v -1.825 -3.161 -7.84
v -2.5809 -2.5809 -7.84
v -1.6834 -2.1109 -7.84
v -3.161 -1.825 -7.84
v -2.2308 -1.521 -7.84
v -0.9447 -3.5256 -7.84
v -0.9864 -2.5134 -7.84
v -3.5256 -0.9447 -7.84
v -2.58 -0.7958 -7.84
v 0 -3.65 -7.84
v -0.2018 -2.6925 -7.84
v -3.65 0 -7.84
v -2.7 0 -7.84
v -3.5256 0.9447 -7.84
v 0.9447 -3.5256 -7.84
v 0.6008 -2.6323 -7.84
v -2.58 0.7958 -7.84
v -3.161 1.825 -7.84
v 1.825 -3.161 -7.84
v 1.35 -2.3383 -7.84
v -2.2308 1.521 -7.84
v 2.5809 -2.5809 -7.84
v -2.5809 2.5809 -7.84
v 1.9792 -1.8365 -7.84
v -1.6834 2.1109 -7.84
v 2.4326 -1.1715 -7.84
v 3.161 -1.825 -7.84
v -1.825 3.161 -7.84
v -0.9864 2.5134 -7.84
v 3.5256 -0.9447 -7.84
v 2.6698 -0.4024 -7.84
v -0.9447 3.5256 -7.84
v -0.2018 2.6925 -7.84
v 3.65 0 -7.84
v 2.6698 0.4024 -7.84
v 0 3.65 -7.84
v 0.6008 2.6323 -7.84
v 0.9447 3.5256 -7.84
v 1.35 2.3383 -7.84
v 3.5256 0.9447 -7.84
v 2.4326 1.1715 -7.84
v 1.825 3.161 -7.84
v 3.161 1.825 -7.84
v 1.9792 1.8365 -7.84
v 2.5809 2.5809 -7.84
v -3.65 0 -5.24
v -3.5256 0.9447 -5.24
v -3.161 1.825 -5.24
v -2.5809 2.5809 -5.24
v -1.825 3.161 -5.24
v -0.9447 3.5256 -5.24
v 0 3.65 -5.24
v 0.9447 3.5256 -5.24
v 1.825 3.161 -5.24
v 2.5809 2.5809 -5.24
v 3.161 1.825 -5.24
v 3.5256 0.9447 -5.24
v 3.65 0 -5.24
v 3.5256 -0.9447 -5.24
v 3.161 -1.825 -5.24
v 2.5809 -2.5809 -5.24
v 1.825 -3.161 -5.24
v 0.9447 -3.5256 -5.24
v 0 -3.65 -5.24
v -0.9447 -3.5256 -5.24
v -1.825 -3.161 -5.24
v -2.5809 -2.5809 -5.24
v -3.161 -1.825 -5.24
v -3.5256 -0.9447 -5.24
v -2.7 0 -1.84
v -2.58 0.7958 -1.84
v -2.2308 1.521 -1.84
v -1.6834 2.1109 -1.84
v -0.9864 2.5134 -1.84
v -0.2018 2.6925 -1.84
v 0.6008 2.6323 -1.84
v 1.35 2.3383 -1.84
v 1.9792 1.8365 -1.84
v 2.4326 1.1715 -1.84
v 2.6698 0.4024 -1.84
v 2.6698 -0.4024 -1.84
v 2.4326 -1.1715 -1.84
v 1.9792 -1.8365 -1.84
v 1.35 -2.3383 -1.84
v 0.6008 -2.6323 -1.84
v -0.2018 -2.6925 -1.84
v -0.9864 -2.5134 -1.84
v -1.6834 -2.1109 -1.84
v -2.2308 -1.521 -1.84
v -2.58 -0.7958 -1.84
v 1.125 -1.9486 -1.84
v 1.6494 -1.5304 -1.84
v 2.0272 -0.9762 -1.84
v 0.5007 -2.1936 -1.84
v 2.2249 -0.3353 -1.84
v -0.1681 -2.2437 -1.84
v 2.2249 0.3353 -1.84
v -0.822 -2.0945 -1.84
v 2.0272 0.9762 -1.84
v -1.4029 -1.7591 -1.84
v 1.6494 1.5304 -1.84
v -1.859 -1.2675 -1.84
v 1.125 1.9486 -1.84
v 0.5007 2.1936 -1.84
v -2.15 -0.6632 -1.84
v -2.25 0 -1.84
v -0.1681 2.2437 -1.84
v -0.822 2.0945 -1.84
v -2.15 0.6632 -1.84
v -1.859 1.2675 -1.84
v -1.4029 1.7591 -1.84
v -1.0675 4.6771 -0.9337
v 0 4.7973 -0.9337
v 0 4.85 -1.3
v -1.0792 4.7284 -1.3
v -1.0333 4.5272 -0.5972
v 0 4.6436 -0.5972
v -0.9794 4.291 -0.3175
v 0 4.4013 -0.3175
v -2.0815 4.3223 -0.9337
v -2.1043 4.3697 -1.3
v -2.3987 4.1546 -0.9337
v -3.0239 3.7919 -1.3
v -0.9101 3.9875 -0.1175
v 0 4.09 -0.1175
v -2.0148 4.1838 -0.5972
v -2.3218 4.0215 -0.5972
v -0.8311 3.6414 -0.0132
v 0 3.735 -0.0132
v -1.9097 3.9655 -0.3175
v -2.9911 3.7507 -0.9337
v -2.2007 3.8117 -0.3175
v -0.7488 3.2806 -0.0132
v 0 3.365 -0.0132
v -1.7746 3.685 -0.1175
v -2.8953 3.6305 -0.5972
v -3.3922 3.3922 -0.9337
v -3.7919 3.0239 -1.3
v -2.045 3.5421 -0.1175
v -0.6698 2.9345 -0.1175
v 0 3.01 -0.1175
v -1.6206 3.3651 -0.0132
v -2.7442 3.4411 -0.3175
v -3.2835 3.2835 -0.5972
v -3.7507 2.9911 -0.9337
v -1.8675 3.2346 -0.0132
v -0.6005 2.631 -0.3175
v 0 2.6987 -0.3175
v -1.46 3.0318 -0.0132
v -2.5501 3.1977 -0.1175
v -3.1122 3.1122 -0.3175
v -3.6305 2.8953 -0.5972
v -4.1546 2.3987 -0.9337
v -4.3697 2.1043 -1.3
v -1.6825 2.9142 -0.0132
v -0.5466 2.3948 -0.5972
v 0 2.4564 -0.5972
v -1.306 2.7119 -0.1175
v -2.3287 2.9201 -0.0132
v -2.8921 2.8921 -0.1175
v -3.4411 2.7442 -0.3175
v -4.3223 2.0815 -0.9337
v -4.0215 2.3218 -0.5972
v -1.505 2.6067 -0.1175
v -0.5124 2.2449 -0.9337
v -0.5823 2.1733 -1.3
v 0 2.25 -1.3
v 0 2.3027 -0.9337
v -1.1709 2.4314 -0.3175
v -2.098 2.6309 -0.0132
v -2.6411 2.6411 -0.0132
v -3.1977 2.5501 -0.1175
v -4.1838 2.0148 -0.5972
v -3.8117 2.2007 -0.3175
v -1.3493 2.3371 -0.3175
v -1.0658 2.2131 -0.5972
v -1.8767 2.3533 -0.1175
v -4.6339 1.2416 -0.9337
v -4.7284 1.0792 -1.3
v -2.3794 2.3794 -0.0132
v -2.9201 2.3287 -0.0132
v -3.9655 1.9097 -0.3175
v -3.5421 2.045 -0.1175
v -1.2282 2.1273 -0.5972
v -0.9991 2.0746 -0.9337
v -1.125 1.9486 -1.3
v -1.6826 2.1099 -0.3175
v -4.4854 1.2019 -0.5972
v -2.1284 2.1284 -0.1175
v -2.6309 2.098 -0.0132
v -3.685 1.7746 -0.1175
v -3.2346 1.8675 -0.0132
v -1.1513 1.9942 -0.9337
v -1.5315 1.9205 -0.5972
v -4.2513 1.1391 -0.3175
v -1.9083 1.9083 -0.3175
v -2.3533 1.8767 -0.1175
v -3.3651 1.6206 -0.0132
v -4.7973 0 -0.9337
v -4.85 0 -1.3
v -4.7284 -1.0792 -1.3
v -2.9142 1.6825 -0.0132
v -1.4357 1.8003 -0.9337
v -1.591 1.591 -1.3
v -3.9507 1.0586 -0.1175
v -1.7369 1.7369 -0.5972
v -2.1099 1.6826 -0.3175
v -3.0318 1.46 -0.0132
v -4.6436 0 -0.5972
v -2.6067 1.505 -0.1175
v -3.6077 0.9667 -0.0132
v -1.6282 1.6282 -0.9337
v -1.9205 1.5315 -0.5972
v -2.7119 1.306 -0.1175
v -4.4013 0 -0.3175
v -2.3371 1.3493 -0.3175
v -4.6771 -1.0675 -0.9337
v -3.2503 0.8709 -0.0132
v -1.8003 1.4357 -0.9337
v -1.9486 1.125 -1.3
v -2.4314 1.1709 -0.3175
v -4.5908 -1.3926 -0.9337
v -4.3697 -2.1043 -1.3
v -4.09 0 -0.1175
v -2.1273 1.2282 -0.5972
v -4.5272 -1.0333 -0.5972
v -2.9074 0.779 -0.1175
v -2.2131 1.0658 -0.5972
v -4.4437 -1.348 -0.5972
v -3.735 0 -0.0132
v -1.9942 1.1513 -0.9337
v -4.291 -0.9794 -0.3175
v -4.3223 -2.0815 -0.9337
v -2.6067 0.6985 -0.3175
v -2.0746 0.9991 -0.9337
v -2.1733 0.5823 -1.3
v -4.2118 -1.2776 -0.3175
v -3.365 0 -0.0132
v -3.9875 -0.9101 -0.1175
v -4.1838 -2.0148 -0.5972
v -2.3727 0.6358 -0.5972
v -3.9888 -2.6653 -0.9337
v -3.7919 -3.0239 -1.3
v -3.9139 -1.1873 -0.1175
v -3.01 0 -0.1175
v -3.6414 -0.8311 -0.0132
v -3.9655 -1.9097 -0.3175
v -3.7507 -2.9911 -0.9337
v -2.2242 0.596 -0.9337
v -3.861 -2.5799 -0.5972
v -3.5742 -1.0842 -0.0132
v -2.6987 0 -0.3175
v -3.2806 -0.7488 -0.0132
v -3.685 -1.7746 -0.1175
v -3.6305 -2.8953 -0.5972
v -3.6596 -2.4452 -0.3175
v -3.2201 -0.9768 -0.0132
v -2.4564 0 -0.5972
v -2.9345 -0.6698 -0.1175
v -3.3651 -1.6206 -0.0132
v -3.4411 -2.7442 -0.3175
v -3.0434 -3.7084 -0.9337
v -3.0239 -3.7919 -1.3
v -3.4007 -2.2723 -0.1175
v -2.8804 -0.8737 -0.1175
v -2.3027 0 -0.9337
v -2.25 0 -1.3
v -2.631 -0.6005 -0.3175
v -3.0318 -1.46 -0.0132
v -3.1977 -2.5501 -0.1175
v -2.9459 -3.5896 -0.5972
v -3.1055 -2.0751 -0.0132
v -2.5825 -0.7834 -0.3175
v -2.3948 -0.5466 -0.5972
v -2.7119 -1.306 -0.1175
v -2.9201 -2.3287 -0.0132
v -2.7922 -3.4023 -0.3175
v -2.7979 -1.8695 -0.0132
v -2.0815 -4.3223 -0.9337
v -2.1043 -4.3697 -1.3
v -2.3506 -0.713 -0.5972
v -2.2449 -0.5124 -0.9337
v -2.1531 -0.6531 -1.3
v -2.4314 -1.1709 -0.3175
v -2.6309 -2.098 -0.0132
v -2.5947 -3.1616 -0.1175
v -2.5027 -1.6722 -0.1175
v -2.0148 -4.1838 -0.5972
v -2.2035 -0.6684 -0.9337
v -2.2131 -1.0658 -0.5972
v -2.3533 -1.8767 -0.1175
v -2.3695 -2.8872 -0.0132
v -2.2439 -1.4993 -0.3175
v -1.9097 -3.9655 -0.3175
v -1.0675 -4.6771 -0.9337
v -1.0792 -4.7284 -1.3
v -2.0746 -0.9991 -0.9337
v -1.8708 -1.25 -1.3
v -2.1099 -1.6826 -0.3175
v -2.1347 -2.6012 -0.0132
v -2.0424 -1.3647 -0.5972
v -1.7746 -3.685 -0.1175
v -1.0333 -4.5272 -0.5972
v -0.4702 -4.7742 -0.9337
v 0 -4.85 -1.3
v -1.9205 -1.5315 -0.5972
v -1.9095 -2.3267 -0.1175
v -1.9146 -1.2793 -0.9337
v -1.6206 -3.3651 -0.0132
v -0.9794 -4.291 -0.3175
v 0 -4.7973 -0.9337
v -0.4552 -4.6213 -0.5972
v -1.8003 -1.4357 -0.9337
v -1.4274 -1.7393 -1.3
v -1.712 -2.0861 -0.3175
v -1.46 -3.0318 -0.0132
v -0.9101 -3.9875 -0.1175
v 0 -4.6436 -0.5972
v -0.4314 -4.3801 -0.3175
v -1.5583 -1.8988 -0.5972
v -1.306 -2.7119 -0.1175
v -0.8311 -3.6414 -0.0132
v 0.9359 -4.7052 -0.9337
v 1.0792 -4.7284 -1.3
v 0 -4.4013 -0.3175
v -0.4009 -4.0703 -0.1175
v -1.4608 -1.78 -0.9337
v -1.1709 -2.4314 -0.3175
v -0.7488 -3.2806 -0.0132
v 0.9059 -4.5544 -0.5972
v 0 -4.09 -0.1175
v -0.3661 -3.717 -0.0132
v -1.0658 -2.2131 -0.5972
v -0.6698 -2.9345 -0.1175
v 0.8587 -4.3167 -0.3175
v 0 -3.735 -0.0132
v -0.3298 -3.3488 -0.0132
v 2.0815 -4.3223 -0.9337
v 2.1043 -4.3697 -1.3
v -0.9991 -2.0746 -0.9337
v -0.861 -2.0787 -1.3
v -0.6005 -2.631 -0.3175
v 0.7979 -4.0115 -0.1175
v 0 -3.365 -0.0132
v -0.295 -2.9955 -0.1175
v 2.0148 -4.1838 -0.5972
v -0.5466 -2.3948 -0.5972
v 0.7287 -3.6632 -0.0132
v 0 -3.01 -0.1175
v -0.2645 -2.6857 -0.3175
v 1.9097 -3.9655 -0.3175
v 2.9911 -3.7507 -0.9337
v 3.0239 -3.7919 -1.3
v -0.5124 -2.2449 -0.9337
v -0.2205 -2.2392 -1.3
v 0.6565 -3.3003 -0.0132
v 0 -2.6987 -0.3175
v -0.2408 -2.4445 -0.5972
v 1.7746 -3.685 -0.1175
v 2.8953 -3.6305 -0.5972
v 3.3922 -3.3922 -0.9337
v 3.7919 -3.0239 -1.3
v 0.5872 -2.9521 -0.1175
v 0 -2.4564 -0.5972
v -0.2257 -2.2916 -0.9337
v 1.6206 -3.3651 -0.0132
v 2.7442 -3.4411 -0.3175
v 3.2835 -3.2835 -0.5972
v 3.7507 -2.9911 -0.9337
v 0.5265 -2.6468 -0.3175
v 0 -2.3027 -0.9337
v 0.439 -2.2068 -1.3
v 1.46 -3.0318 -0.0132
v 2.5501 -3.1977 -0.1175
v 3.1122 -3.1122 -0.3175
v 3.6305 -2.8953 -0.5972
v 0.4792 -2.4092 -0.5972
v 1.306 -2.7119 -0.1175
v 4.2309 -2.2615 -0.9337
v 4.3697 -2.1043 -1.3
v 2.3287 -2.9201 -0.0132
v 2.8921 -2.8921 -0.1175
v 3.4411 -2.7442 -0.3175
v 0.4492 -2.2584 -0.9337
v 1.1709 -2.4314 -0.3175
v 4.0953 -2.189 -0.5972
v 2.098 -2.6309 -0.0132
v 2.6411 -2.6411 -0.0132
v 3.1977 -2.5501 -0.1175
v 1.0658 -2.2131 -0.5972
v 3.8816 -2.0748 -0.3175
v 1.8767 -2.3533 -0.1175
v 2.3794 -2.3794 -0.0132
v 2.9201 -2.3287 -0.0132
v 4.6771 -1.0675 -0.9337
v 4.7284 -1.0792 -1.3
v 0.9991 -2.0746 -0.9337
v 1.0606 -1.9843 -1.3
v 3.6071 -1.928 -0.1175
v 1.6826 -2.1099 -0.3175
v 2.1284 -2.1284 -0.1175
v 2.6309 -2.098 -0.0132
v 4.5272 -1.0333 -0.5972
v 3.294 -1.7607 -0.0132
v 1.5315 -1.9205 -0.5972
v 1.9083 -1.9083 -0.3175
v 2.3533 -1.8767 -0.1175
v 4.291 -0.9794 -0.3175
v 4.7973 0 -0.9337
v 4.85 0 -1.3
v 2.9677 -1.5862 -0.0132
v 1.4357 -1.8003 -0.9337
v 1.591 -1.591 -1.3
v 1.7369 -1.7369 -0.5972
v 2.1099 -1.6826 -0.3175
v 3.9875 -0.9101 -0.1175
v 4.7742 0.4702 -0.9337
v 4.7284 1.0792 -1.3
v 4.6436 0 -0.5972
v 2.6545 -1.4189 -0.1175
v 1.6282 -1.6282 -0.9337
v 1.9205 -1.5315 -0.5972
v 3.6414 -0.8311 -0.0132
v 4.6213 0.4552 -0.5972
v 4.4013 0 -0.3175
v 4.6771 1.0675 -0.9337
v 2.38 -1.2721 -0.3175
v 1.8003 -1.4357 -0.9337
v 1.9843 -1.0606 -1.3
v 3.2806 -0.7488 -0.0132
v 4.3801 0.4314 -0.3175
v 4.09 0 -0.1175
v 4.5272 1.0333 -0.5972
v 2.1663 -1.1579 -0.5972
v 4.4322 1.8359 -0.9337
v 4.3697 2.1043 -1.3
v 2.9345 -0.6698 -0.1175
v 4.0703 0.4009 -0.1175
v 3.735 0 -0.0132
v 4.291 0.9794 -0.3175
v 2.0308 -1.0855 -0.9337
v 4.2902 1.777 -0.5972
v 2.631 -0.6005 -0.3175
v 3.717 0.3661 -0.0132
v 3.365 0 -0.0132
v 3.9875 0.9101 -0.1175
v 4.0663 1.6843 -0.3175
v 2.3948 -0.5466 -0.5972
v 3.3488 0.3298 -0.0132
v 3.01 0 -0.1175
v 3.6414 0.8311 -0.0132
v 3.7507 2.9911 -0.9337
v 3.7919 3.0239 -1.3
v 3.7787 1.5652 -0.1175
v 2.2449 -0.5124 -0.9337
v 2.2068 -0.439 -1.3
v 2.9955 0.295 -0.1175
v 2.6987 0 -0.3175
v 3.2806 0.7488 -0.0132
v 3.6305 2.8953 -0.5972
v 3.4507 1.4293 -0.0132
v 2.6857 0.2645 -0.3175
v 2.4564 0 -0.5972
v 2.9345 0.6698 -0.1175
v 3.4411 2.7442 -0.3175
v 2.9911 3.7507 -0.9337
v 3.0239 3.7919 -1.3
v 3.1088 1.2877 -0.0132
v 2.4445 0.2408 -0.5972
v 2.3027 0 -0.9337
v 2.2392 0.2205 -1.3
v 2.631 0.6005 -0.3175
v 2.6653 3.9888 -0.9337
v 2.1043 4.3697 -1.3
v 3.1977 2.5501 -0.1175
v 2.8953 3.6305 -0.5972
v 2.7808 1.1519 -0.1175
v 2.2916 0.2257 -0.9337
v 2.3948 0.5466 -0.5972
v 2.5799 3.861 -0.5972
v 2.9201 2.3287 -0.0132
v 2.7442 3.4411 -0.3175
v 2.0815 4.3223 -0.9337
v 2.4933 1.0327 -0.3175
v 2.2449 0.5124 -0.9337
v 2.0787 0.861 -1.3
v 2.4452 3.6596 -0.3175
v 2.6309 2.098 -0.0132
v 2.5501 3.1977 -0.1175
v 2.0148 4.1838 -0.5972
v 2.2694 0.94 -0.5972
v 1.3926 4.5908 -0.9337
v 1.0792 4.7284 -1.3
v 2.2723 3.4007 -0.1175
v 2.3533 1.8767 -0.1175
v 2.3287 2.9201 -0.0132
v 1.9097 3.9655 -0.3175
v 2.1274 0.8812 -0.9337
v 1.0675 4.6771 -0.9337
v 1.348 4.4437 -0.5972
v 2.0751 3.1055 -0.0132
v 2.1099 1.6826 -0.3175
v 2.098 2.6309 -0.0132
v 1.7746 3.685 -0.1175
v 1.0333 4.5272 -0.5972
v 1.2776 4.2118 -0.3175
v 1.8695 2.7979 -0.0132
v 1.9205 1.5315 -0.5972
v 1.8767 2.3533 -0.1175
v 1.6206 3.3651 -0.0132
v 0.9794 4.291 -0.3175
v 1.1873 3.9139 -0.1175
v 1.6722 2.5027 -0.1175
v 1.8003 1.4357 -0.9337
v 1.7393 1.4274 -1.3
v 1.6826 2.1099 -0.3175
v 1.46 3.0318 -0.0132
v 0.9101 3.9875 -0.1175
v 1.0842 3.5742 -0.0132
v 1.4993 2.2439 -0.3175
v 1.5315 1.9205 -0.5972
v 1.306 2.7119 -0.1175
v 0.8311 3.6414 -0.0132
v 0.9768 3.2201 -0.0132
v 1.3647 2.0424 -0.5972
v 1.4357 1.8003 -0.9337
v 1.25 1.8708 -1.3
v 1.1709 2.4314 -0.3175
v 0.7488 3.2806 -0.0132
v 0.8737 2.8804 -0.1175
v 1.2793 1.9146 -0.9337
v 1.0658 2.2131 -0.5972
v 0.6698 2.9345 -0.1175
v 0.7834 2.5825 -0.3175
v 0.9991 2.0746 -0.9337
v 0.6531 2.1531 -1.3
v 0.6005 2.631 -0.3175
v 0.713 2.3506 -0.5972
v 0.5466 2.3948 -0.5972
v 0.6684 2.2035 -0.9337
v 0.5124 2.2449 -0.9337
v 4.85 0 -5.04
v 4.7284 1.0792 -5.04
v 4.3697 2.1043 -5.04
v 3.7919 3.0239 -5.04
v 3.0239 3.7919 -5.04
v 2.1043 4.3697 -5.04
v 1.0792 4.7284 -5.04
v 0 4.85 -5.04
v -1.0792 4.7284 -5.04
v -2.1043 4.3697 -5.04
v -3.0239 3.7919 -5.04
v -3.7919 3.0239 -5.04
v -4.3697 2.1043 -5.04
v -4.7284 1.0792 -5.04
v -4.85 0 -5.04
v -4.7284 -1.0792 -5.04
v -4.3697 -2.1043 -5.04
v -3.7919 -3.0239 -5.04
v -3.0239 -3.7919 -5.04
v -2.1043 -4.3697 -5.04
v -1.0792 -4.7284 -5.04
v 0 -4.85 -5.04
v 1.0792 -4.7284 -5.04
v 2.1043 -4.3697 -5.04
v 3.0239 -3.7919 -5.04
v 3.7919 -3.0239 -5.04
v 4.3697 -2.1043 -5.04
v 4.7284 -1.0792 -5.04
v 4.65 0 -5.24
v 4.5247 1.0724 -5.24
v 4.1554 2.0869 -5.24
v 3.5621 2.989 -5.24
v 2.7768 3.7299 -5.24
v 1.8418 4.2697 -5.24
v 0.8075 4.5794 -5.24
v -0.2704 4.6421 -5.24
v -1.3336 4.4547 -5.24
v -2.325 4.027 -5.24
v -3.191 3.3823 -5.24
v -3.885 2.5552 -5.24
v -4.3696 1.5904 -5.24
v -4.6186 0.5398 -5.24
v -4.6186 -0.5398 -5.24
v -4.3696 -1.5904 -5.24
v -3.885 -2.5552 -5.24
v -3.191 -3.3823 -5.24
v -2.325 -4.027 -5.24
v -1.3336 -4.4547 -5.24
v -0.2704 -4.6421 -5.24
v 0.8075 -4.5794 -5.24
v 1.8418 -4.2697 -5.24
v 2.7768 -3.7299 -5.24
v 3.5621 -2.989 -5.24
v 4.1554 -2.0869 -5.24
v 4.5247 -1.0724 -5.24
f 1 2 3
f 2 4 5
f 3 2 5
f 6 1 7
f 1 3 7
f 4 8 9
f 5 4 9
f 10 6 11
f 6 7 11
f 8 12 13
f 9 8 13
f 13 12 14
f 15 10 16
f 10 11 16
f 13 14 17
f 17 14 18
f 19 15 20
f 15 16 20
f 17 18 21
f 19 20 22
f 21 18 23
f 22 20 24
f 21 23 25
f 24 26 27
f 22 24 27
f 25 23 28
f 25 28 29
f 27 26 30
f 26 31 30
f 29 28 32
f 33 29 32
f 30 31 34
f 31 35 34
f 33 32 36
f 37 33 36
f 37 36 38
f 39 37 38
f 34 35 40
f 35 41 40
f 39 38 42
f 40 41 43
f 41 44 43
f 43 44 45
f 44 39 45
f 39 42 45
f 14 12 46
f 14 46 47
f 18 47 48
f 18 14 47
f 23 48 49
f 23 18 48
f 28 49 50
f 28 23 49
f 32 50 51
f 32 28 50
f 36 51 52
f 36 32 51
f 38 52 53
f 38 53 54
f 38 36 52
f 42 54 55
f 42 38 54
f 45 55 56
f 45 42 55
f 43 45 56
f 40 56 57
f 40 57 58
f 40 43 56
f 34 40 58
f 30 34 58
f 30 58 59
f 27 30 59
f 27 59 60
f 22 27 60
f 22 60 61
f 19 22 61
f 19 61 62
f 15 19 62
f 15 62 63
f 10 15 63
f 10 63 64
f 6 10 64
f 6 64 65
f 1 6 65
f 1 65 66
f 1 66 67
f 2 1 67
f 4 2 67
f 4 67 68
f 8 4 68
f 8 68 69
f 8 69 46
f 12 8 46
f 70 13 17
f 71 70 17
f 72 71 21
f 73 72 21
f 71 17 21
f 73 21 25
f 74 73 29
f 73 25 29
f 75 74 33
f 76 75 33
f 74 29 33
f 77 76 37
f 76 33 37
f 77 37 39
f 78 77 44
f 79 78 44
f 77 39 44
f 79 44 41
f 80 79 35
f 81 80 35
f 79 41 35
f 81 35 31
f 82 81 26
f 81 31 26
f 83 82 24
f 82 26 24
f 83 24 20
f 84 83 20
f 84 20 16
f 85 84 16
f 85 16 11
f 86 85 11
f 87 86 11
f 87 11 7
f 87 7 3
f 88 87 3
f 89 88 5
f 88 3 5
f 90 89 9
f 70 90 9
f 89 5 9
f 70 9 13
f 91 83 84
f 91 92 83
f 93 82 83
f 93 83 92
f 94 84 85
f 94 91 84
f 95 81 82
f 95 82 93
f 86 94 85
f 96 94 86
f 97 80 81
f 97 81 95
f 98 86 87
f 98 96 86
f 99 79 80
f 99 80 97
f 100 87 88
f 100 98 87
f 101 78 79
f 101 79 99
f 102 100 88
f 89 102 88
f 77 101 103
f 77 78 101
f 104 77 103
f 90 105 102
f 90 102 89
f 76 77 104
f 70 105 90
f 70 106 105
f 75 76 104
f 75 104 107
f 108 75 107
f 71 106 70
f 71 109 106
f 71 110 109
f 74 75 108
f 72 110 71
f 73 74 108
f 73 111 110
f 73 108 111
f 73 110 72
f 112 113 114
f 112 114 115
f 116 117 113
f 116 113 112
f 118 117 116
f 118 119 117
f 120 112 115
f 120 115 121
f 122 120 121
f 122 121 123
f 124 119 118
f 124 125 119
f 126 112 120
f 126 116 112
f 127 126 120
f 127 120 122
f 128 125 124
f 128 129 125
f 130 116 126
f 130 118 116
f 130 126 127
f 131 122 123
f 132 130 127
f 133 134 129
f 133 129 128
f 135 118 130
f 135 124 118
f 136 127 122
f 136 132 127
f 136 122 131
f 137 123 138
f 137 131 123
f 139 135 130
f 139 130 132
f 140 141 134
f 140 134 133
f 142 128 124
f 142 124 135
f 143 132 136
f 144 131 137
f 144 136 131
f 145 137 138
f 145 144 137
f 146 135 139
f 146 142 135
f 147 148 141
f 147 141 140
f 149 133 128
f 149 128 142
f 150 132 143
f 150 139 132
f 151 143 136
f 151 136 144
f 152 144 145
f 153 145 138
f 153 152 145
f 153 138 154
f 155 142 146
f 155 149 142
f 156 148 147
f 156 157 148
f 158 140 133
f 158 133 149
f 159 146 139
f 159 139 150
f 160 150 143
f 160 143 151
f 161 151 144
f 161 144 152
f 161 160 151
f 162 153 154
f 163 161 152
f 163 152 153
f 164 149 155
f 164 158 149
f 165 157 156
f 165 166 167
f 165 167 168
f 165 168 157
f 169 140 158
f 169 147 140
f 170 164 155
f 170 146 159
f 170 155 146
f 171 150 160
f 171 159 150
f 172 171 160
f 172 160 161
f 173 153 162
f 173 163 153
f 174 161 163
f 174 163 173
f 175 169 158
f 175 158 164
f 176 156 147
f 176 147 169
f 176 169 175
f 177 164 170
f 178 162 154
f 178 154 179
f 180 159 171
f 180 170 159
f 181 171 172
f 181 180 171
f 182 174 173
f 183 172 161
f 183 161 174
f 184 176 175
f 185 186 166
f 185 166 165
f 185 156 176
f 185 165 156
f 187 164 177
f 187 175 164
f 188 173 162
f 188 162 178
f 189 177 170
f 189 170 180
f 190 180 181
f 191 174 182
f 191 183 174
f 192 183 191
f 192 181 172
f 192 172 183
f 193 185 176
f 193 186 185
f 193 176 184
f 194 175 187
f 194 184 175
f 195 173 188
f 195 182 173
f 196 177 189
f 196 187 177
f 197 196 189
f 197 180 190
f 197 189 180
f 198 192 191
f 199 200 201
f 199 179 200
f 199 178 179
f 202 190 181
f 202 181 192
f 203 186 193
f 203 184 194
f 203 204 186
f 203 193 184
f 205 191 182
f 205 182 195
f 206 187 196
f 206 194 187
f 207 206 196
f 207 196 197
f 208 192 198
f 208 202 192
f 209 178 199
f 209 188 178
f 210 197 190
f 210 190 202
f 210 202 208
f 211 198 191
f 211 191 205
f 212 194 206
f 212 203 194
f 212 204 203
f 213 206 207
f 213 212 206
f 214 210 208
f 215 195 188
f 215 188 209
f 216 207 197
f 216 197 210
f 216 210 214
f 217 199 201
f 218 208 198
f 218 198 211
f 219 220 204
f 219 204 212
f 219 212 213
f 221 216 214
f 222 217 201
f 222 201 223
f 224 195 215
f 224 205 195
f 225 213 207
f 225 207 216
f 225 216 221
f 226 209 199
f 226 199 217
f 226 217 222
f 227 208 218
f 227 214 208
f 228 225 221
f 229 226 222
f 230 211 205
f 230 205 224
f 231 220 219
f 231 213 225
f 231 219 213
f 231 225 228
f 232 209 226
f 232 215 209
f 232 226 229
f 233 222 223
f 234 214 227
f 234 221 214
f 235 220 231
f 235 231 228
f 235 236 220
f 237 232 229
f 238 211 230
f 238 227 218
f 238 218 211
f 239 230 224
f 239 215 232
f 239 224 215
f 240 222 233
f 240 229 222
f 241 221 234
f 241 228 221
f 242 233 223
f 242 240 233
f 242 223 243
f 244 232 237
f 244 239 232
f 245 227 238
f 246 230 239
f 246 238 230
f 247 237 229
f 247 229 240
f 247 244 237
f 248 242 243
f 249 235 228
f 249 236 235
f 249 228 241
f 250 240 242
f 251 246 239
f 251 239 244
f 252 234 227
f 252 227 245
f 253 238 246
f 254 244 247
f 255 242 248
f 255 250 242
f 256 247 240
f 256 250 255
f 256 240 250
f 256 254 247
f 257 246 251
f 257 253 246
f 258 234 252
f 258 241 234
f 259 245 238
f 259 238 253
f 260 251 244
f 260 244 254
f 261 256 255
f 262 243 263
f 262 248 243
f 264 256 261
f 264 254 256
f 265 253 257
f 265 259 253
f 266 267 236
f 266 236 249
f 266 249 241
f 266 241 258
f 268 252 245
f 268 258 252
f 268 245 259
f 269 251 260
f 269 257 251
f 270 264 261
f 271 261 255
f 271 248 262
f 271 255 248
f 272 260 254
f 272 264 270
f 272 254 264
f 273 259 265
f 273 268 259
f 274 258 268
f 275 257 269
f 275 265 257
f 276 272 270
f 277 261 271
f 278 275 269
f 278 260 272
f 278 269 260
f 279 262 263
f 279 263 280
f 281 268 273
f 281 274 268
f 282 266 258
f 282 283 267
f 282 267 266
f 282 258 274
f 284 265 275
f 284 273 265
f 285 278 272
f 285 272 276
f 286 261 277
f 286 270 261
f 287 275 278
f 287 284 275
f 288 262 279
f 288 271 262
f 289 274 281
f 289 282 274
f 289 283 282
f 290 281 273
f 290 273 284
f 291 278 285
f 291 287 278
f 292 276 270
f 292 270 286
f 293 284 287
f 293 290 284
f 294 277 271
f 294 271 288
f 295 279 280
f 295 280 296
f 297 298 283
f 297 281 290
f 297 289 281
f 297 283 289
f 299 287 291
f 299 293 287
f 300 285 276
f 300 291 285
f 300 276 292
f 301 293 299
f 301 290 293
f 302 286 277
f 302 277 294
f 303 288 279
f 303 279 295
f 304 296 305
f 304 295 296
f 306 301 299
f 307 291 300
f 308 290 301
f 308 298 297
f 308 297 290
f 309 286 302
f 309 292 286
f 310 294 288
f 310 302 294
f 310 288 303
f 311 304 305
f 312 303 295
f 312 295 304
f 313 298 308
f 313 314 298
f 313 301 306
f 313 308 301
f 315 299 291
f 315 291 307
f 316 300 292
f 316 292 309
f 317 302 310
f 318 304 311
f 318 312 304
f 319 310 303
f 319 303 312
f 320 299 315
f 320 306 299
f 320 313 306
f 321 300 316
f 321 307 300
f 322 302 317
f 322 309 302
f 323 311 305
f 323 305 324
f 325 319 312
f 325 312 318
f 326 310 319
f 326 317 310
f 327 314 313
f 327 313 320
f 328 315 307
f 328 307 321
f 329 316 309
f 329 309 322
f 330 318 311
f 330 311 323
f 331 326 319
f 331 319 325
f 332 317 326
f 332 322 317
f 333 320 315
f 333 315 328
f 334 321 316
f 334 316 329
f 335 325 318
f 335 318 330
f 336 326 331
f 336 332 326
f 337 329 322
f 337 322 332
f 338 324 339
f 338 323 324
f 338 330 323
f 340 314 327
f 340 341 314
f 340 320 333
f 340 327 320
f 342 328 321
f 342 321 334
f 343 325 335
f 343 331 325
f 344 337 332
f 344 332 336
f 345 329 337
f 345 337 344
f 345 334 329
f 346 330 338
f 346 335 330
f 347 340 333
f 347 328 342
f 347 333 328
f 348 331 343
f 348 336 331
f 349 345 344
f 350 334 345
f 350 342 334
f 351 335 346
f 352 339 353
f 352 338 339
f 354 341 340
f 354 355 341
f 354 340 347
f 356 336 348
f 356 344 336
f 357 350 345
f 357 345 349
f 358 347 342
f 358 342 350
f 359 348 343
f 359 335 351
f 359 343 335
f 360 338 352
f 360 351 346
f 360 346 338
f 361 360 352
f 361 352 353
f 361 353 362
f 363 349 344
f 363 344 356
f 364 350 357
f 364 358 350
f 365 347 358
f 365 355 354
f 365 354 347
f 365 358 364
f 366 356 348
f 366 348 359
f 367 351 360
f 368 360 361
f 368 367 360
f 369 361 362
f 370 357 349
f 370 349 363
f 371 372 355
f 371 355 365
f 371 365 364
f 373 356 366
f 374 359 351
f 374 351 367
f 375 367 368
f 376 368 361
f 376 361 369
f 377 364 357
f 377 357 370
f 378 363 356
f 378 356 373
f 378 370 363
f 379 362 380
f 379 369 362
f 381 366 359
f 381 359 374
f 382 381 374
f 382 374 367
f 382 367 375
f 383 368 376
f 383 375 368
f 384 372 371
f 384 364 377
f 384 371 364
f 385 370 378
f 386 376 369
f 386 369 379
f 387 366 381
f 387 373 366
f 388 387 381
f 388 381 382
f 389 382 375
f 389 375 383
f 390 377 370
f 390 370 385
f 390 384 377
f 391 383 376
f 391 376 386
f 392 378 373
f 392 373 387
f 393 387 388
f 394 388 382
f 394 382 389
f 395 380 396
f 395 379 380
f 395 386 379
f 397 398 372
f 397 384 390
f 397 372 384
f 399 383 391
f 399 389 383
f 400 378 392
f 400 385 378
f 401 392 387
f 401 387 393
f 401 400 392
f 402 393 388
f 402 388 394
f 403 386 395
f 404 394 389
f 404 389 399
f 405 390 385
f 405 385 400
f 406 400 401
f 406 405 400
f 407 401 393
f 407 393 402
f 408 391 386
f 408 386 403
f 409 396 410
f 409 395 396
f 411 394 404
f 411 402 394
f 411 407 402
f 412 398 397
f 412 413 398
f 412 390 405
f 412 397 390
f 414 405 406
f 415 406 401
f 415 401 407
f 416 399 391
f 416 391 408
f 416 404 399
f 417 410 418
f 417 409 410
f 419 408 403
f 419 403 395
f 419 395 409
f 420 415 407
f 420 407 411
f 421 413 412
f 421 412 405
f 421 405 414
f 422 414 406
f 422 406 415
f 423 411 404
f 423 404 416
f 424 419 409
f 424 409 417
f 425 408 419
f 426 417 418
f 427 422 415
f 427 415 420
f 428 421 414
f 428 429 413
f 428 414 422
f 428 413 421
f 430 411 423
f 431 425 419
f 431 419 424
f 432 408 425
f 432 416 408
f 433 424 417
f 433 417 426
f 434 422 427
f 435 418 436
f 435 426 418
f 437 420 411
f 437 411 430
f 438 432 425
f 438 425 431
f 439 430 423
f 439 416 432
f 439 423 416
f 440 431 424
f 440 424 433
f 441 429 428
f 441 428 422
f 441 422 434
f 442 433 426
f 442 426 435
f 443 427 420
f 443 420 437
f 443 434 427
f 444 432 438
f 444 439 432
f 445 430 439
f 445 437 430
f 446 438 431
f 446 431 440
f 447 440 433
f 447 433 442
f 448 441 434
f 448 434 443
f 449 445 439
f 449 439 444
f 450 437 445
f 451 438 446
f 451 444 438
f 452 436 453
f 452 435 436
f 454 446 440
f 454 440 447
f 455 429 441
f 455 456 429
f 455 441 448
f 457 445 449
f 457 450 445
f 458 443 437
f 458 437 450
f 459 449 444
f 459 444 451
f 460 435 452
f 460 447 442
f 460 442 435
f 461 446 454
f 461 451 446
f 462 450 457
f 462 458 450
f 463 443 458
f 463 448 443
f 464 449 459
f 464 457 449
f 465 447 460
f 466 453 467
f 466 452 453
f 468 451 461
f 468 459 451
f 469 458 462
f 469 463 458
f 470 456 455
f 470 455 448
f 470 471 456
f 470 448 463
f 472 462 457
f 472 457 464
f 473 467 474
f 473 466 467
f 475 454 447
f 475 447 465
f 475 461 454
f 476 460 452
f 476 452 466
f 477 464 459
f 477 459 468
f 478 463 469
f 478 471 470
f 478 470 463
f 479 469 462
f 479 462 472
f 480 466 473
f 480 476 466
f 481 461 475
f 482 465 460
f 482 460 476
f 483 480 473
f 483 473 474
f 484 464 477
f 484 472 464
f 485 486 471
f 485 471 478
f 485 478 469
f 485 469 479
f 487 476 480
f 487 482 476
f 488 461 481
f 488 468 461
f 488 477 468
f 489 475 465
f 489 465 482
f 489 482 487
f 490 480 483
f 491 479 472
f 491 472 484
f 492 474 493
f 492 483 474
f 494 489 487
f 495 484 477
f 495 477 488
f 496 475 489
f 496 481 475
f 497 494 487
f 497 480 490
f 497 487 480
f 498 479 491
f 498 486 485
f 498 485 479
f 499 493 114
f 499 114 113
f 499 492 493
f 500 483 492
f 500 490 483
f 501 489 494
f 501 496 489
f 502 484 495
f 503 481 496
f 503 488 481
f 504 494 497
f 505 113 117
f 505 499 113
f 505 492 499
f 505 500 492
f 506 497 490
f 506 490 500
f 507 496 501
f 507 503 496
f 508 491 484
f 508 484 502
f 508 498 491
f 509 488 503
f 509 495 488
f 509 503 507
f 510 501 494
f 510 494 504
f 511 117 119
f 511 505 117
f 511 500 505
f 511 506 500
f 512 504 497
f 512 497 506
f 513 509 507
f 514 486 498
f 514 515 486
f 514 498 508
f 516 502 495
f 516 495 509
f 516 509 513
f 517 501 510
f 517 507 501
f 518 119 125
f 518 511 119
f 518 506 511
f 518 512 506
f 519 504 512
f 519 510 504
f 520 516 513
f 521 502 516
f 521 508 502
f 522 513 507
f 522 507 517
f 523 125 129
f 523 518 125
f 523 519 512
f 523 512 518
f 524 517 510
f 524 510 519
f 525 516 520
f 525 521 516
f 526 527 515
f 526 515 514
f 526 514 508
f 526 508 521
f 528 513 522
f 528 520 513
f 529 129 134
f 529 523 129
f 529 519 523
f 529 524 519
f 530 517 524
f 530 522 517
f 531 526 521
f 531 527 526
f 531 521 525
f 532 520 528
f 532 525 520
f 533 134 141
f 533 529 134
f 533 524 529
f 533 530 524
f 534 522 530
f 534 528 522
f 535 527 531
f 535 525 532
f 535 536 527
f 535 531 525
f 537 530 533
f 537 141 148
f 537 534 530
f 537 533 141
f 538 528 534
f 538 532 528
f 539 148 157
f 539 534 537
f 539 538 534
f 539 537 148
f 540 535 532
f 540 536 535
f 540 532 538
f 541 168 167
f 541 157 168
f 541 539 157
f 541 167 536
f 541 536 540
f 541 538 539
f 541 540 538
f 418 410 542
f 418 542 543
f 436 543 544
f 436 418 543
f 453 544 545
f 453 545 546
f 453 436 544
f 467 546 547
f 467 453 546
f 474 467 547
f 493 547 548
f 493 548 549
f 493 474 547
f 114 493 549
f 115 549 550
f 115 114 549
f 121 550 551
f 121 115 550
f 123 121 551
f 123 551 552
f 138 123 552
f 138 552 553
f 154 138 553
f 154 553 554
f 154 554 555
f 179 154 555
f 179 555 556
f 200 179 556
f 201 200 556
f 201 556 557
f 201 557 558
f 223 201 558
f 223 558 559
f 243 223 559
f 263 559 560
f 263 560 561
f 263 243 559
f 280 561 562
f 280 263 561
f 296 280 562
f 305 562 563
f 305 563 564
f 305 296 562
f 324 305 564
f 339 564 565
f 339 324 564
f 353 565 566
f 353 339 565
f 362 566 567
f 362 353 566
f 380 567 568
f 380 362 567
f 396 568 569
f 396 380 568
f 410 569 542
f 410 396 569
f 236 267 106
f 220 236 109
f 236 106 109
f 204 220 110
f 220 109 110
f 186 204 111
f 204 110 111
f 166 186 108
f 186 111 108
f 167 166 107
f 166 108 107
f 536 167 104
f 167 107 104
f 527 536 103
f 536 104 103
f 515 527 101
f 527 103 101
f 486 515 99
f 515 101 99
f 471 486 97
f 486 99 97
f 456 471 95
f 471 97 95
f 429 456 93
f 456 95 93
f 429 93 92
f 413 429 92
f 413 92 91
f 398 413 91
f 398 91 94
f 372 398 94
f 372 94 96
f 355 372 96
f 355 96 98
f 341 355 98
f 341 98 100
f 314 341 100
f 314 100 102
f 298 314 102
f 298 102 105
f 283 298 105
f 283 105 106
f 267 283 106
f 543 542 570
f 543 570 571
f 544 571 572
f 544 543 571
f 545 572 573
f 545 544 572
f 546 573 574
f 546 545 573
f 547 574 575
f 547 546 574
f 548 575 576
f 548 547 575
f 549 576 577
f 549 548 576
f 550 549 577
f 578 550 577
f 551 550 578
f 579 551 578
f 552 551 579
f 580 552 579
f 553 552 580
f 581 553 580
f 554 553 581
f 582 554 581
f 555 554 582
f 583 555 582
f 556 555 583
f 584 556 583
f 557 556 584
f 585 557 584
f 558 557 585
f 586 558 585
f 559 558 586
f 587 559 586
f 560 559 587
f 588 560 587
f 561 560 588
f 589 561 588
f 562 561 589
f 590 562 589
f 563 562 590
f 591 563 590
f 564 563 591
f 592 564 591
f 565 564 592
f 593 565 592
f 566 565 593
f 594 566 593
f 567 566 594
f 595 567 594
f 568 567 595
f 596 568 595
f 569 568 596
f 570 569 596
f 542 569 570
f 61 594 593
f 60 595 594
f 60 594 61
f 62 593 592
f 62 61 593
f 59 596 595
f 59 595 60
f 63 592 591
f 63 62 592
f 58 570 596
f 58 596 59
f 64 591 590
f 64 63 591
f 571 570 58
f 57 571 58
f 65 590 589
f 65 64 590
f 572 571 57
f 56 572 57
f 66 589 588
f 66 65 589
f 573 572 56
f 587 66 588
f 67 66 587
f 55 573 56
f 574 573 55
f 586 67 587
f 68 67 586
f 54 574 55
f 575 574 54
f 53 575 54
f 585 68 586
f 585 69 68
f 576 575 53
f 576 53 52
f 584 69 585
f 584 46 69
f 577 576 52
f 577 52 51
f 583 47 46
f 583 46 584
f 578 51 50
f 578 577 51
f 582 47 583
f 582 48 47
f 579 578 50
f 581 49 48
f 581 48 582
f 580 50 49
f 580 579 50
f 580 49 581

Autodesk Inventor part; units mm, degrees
ref_plane "YZ Plane" through (0, 0, 0) normal (1, 0, 0) x (0, 1, 0)
ref_plane "XZ Plane" through (0, 0, 0) normal (0, 1, 0) x (-1, 0, 0)
ref_plane "XY Plane" through (0, 0, 0) normal (0, 0, 1) x (1, 0, 0)
sketch "Sketch1" plane through (0, 0, 0) normal (0, 0, 1) x (1, 0, 0)
  circle A0 centre (0, 0) radius 4.85
  dimension "d0" = 9.7
extrude "Extrusion1" add sketch "Sketch1" against normal blind 7.84
sketch "Sketch2" plane through (0, 0, -7.84) normal (0, 0, -1) x (-1, 0, 0)
  circle A0 centre (0, 0) radius 4.85
  circle A1 centre (0, 0) radius 3.65
  circle A2 centre (0, 0) radius 4.85 projected
  dimension "d3" = 7.3
extrude "Extrusion2" cut sketch "Sketch2" against normal blind 2.6
sketch "Sketch5" plane through (0, 0, -7.84) normal (0, 0, -1) x (-1, 0, 0)
  circle A0 centre (0, 0) radius 2.7
  dimension "d21" = 5.4
extrude "Extrusion4" cut sketch "Sketch5" against normal blind 6
sketch "Sketch6" plane through (0, 0, -1.84) normal (0, 0, -1) x (-1, 0, 0)
  circle A0 centre (0, 0) radius 2.25
  dimension "d24" = 4.5
extrude "Extrusion5" cut sketch "Sketch6" against normal through all
sketch "Sketch7" plane through (0, 0, 0) normal (1, 0, 0) x (0, 1, 0)
  line L0 (4.85, 1) -> (4.85, -1.3)
  arc A0 (4.85, -1.3) -> (2.25, -1.3) centre (3.55, -1.3) ccw
  line L1 (2.25, -1.3) -> (2.25, 1)
  line L2 (2.25, 1) -> (4.85, 1)
  line L3 (0, 6.9365) -> (0, -11.7629) construction
  point P0 (0, 0)
  point P1 (4.85, -0.15)
  dimension "d27" = 4.85
  dimension "d28" = 2.25
  dimension "d29" = 1.3
  dimension "d30" = 1
revolve "Revolution2" cut sketch "Sketch7" angle 360 about axis through (0, 0, 6.9365) along (0, 0, -1)
chamfer "Chamfer2" distance 0.2 angle 45 1 edges at (-4.85, 0, -5.24)
properties part number "cap_top"
